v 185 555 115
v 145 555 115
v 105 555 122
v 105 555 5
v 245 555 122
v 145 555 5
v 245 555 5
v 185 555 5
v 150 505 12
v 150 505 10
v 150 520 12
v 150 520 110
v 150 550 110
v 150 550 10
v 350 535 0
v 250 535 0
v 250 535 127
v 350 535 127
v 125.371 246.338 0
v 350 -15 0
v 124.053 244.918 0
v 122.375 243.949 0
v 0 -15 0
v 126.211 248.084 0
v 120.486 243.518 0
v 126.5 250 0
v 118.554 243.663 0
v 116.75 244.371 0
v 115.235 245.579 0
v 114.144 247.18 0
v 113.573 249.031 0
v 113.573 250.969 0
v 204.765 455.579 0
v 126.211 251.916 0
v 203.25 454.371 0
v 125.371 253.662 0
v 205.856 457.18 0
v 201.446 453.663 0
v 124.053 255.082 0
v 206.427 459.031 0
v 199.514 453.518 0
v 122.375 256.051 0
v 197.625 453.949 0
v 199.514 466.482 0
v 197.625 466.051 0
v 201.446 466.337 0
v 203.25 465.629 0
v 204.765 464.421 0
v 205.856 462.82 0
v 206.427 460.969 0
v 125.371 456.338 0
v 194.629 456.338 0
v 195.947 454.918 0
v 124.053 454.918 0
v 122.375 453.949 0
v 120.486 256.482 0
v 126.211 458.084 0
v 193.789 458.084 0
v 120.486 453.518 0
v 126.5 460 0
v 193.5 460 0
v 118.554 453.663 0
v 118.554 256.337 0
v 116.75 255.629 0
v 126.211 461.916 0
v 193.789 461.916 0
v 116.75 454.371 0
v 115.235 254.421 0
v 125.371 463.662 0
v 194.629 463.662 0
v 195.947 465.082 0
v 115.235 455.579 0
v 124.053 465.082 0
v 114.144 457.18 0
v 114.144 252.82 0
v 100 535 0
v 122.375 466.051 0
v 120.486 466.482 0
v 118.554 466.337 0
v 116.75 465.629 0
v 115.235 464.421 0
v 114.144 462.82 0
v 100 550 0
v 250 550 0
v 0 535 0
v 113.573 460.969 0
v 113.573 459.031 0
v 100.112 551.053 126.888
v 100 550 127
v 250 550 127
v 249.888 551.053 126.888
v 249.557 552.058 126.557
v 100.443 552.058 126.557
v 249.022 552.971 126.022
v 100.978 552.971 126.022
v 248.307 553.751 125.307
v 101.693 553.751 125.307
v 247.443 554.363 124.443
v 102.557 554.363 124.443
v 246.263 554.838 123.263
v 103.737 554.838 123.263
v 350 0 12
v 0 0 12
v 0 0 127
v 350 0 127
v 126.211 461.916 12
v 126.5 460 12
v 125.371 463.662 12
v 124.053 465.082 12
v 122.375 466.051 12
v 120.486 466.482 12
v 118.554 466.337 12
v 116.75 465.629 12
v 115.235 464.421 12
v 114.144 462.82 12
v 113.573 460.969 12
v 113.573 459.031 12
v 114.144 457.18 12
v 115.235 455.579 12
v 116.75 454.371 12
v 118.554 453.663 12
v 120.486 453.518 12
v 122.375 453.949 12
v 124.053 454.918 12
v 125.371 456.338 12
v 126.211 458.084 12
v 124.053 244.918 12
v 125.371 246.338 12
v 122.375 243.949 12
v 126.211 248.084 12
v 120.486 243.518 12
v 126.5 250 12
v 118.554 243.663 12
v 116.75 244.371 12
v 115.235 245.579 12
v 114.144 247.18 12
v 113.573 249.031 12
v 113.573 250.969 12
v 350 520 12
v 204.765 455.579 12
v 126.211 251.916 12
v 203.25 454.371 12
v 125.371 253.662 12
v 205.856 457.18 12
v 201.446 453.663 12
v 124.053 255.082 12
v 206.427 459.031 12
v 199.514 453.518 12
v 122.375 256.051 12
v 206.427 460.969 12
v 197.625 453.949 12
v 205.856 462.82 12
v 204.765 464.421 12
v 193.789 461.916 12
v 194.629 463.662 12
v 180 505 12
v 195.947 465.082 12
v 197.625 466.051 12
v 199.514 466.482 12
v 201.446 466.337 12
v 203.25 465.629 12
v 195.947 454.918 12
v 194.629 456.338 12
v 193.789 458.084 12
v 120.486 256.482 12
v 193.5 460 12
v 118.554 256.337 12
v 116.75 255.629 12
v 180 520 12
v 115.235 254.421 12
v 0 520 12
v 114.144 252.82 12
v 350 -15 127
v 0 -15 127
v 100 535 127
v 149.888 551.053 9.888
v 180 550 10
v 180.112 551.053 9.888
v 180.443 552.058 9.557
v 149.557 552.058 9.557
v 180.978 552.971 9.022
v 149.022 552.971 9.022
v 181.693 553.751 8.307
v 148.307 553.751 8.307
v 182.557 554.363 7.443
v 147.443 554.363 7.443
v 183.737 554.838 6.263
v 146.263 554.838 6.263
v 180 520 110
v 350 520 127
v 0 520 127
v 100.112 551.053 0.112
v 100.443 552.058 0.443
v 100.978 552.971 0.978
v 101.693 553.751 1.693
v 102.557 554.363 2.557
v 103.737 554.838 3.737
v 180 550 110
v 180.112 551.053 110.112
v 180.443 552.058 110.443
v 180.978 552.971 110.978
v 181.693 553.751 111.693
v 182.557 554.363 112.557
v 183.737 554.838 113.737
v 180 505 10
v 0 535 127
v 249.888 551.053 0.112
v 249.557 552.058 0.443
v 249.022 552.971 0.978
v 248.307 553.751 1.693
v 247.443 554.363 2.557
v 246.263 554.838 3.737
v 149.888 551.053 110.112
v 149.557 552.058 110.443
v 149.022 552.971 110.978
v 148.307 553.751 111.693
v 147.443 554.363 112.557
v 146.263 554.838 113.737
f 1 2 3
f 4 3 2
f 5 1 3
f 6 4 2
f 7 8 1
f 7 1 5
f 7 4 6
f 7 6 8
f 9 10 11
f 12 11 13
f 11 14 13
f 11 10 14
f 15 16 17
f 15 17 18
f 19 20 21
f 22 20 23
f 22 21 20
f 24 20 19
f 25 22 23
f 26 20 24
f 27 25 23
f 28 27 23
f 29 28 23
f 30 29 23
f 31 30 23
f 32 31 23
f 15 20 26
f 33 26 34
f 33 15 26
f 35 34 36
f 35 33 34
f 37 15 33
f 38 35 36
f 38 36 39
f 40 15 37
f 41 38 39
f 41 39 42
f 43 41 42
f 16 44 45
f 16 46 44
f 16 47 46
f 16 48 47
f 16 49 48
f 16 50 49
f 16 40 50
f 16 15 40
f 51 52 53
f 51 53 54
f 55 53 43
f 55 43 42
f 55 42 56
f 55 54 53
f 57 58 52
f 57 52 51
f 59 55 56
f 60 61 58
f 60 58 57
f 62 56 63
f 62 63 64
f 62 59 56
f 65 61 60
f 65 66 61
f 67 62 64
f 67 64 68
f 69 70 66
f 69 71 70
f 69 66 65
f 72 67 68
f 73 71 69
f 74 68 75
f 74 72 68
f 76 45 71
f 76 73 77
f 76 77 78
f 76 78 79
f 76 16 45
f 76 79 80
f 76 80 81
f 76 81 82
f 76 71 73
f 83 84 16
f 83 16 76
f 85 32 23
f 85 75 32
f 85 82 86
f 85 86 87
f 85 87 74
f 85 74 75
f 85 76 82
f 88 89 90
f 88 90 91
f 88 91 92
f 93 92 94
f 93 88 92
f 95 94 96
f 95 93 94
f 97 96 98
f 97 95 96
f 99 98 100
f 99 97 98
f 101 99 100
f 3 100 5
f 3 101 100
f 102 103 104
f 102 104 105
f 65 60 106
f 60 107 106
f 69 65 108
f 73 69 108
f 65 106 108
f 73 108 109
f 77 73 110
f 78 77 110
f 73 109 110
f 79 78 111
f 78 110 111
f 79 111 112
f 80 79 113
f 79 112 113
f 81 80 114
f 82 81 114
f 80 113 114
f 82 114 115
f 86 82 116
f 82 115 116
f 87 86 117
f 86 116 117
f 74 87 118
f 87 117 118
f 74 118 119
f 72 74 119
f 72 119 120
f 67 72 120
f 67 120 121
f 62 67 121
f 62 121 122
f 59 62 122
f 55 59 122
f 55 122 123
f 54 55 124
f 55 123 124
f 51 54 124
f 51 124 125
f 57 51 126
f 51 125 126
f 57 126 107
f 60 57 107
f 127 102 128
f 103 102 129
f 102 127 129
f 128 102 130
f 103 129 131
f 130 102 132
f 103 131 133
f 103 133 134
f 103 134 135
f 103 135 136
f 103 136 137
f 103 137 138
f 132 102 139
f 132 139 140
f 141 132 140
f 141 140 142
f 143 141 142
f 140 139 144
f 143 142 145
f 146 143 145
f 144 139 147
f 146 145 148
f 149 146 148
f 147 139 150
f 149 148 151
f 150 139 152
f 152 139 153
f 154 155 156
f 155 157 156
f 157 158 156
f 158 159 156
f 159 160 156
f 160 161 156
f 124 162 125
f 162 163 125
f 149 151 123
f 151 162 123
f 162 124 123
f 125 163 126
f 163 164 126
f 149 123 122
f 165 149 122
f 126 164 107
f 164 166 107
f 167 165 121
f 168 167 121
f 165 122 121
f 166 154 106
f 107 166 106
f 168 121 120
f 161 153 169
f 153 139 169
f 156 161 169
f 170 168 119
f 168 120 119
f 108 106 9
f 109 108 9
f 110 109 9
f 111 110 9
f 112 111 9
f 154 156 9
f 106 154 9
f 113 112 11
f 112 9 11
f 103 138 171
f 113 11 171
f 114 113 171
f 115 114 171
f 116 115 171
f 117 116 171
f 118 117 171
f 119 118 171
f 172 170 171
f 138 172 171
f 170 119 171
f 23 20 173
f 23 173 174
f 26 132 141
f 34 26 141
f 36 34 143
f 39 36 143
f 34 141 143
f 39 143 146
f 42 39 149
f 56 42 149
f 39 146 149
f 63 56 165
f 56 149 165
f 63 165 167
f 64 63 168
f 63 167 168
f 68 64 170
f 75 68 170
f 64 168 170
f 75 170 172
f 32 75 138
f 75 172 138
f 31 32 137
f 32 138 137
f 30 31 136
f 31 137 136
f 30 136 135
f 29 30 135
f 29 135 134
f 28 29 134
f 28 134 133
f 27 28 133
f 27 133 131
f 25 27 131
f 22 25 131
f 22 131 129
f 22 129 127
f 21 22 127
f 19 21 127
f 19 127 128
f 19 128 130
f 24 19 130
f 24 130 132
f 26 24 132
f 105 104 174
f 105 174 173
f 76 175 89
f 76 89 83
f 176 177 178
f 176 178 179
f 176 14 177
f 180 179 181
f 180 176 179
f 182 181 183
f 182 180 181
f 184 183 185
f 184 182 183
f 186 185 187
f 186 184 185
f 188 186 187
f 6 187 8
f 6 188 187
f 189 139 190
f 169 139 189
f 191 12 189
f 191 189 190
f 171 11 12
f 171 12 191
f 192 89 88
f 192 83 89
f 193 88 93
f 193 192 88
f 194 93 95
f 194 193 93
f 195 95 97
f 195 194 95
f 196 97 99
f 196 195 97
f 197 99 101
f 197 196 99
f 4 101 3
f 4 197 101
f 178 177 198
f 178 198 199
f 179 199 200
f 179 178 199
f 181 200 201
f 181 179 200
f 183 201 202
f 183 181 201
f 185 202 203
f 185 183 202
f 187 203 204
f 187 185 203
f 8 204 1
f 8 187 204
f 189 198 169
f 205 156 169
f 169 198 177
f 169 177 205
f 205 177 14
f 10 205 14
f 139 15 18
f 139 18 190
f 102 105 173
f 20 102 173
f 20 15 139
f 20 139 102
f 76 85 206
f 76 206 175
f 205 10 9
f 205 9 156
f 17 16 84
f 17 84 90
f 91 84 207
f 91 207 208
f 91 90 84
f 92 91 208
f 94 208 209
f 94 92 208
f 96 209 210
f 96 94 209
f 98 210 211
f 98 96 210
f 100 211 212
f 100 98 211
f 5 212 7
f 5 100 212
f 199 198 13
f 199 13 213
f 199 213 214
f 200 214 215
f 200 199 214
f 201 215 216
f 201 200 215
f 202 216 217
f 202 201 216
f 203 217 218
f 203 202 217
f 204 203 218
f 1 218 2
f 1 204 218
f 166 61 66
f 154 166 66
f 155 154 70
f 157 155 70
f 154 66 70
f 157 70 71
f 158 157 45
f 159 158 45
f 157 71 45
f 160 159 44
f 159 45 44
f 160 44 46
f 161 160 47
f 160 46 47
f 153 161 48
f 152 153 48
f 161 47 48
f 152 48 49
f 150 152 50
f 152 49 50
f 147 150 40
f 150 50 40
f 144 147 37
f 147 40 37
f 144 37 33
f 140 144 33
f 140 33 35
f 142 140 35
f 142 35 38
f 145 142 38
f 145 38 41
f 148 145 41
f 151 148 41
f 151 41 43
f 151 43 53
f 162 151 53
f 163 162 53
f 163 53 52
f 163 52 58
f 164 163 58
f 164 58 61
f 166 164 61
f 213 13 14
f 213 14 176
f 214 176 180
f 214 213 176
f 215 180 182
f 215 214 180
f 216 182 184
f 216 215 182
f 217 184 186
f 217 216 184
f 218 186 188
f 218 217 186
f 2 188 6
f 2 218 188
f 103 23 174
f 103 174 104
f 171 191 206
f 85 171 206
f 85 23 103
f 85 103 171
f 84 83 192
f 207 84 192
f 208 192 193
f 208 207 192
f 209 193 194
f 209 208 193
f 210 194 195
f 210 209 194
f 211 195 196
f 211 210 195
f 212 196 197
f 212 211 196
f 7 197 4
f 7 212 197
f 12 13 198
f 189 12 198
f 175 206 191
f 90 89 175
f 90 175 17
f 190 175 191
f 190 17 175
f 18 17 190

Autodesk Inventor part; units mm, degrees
ref_plane "YZ Plane" through (0, 0, 0) normal (1, 0, 0) x (0, 1, 0)
ref_plane "XZ Plane" through (0, 0, 0) normal (0, 1, 0) x (-1, 0, 0)
ref_plane "XY Plane" through (0, 0, 0) normal (0, 0, 1) x (1, 0, 0)
sketch "Sketch1" plane through (0, 0, 0) normal (0, 0, 1) x (1, 0, 0)
  line L0 (0, 0) -> (350, 0)
  line L1 (350, 0) -> (350, 520)
  line L2 (350, 520) -> (0, 520)
  line L3 (0, 520) -> (0, 0)
  dimension "d0" = 350
  dimension "d1" = 520
extrude "Extrusion1" add sketch "Sketch1" along normal blind 12
sketch "Sketch2" plane through (0, 0, 12) normal (0, 0, 1) x (1, 0, 0)
  line L0 (0, 120) -> (350, 120)
  line L1 (350, 120) -> (350, 370)
  line L2 (350, 0) -> (350, 520) projected
  line L3 (350, 370) -> (0, 370)
  line L4 (0, 520) -> (0, 0) projected
  line L5 (0, 370) -> (0, 520)
  line L6 (350, 520) -> (0, 520) projected
  line L7 (0, 520) -> (350, 520)
  line L8 (350, 520) -> (350, 370)
  circle A0 centre (120, 460) radius 6.5
  circle A1 centre (120, 250) radius 6.5
  dimension "d6" = 13
  dimension "d7" = 13
extrude "Extrusion2" cut sketch "Sketch2" against normal blind 12 contours A0 | A1
thread "Thread1" size "M14x2" class "6H" standard "ANSI Metric M Profile" full length
thread "Thread2" size "M14x2" class "6H" standard "ANSI Metric M Profile" full length
sketch "Sketch3" plane through (0, 0, 0) normal (0, 0, -1) x (-1, 0, 0)
  circle A0 centre (-200, 460) radius 6.5
  point P0 (0, 0)
  dimension "d14" = 13
extrude "Extrusion3" cut sketch "Sketch3" against normal blind 120
sketch "Sketch4" plane through (0, 520, 0) normal (0, 1, 0) x (1, 0, 0)
  line L0 (0, 0) -> (350, 0) projected
  line L1 (350, 0) -> (350, -12) projected
  line L2 (0, 0) -> (350, 0)
  line L3 (350, 0) -> (350, -12)
  line L4 (350, -12) -> (0, -12)
  line L5 (0, -12) -> (0, 0)
extrude "Extrusion4" add sketch "Sketch4" along normal blind 15
sketch "Sketch5" plane through (0, 0, 12) normal (0, 0, 1) x (1, 0, 0)
  line L0 (0, 0) -> (0, 535) projected
  line L1 (0, 535) -> (350, 535)
  line L2 (350, 535) -> (350, 520)
  line L3 (350, 520) -> (0, 520)
  line L4 (0, 520) -> (0, 535)
  dimension "d19" = 350
  dimension "d20" = 15
extrude "Extrusion5" add sketch "Sketch5" along normal blind 80
sketch "Sketch6" plane through (0, 0, 0) normal (0, -1, 0) x (1, 0, 0)
  line L0 (350, 0) -> (0, 0) projected
  line L1 (350, 12) -> (0, 12) projected
  line L2 (0, 0) -> (350, 0)
  line L3 (350, 0) -> (350, 12)
  line L4 (350, 12) -> (0, 12)
  line L5 (0, 12) -> (0, 0)
  dimension "d23" = 350
extrude "Extrusion6" add sketch "Sketch6" along normal blind 15
sketch "Sketch7" plane through (0, 0, 12) normal (0, 0, 1) x (1, 0, 0)
  line L0 (0, 0) -> (350, 0)
  line L1 (350, 0) -> (350, -15)
  line L2 (350, -15) -> (0, -15)
  line L3 (0, -15) -> (0, 0)
extrude "Extrusion7" add sketch "Sketch7" along normal blind 80
sketch "Sketch8" plane through (0, 0, 92) normal (0, 0, 1) x (1, 0, 0)
  line L0 (0, -15) -> (350, -15) projected
  line L1 (0, 0) -> (350, 0)
  line L2 (350, 0) -> (350, -15)
  line L3 (350, -15) -> (0, -15)
  line L4 (0, -15) -> (0, 0)
  line L5 (0, 535) -> (0, 520) projected
  line L6 (0, 520) -> (350, 520) projected
  line L7 (0, 535) -> (350, 535)
  line L8 (350, 535) -> (350, 520)
  line L9 (350, 520) -> (0, 520)
  line L10 (0, 520) -> (0, 535)
extrude "Extrusion8" add sketch "Sketch8" along normal blind 35
sketch "Sketch9" plane through (0, -15, 0) normal (0, -1, 0) x (1, 0, 0)
  point P0 (0, 0)
sketch "Sketch10" plane through (0, 535, 0) normal (0, 1, 0) x (1, 0, 0)
  line L0 (0, 0) -> (350, 0) projected
  line L1 (100, 0) -> (250, 0)
  line L2 (250, 0) -> (250, -127)
  line L3 (250, -127) -> (100, -127)
  line L4 (100, -127) -> (100, 0)
  dimension "d30" = 150
  dimension "d31" = 127
extrude "Extrusion9" add sketch "Sketch10" along normal blind 20
sketch "Sketch11" plane through (0, 555, 0) normal (0, 1, 0) x (1, 0, 0)
  point P0 (0, 0)
sketch "Sketch12" plane through (0, 555, 0) normal (0, 1, 0) x (1, 0, 0)
  point P0 (0, 0)
sketch "Sketch13" plane through (0, 555, 0) normal (0, 1, 0) x (1, 0, 0)
  line L0 (150, -110) -> (180, -110)
  line L1 (180, -110) -> (180, -10)
  line L2 (180, -10) -> (150, -10)
  line L3 (150, -10) -> (150, -110)
  point P0 (0, 0)
  dimension "d34" = 30
  dimension "d35" = 100
extrude "Extrusion10" cut sketch "Sketch13" against normal blind 50
fillet "Fillet1" radius 5 8 edges at (180, 555, 60) (150, 555, 60) (165, 555, 110) (165, 555, 10) (175, 555, 127) (250, 555, 63.5) (175, 555, 0) (100, 555, 63.5)
properties part number "back plate"
